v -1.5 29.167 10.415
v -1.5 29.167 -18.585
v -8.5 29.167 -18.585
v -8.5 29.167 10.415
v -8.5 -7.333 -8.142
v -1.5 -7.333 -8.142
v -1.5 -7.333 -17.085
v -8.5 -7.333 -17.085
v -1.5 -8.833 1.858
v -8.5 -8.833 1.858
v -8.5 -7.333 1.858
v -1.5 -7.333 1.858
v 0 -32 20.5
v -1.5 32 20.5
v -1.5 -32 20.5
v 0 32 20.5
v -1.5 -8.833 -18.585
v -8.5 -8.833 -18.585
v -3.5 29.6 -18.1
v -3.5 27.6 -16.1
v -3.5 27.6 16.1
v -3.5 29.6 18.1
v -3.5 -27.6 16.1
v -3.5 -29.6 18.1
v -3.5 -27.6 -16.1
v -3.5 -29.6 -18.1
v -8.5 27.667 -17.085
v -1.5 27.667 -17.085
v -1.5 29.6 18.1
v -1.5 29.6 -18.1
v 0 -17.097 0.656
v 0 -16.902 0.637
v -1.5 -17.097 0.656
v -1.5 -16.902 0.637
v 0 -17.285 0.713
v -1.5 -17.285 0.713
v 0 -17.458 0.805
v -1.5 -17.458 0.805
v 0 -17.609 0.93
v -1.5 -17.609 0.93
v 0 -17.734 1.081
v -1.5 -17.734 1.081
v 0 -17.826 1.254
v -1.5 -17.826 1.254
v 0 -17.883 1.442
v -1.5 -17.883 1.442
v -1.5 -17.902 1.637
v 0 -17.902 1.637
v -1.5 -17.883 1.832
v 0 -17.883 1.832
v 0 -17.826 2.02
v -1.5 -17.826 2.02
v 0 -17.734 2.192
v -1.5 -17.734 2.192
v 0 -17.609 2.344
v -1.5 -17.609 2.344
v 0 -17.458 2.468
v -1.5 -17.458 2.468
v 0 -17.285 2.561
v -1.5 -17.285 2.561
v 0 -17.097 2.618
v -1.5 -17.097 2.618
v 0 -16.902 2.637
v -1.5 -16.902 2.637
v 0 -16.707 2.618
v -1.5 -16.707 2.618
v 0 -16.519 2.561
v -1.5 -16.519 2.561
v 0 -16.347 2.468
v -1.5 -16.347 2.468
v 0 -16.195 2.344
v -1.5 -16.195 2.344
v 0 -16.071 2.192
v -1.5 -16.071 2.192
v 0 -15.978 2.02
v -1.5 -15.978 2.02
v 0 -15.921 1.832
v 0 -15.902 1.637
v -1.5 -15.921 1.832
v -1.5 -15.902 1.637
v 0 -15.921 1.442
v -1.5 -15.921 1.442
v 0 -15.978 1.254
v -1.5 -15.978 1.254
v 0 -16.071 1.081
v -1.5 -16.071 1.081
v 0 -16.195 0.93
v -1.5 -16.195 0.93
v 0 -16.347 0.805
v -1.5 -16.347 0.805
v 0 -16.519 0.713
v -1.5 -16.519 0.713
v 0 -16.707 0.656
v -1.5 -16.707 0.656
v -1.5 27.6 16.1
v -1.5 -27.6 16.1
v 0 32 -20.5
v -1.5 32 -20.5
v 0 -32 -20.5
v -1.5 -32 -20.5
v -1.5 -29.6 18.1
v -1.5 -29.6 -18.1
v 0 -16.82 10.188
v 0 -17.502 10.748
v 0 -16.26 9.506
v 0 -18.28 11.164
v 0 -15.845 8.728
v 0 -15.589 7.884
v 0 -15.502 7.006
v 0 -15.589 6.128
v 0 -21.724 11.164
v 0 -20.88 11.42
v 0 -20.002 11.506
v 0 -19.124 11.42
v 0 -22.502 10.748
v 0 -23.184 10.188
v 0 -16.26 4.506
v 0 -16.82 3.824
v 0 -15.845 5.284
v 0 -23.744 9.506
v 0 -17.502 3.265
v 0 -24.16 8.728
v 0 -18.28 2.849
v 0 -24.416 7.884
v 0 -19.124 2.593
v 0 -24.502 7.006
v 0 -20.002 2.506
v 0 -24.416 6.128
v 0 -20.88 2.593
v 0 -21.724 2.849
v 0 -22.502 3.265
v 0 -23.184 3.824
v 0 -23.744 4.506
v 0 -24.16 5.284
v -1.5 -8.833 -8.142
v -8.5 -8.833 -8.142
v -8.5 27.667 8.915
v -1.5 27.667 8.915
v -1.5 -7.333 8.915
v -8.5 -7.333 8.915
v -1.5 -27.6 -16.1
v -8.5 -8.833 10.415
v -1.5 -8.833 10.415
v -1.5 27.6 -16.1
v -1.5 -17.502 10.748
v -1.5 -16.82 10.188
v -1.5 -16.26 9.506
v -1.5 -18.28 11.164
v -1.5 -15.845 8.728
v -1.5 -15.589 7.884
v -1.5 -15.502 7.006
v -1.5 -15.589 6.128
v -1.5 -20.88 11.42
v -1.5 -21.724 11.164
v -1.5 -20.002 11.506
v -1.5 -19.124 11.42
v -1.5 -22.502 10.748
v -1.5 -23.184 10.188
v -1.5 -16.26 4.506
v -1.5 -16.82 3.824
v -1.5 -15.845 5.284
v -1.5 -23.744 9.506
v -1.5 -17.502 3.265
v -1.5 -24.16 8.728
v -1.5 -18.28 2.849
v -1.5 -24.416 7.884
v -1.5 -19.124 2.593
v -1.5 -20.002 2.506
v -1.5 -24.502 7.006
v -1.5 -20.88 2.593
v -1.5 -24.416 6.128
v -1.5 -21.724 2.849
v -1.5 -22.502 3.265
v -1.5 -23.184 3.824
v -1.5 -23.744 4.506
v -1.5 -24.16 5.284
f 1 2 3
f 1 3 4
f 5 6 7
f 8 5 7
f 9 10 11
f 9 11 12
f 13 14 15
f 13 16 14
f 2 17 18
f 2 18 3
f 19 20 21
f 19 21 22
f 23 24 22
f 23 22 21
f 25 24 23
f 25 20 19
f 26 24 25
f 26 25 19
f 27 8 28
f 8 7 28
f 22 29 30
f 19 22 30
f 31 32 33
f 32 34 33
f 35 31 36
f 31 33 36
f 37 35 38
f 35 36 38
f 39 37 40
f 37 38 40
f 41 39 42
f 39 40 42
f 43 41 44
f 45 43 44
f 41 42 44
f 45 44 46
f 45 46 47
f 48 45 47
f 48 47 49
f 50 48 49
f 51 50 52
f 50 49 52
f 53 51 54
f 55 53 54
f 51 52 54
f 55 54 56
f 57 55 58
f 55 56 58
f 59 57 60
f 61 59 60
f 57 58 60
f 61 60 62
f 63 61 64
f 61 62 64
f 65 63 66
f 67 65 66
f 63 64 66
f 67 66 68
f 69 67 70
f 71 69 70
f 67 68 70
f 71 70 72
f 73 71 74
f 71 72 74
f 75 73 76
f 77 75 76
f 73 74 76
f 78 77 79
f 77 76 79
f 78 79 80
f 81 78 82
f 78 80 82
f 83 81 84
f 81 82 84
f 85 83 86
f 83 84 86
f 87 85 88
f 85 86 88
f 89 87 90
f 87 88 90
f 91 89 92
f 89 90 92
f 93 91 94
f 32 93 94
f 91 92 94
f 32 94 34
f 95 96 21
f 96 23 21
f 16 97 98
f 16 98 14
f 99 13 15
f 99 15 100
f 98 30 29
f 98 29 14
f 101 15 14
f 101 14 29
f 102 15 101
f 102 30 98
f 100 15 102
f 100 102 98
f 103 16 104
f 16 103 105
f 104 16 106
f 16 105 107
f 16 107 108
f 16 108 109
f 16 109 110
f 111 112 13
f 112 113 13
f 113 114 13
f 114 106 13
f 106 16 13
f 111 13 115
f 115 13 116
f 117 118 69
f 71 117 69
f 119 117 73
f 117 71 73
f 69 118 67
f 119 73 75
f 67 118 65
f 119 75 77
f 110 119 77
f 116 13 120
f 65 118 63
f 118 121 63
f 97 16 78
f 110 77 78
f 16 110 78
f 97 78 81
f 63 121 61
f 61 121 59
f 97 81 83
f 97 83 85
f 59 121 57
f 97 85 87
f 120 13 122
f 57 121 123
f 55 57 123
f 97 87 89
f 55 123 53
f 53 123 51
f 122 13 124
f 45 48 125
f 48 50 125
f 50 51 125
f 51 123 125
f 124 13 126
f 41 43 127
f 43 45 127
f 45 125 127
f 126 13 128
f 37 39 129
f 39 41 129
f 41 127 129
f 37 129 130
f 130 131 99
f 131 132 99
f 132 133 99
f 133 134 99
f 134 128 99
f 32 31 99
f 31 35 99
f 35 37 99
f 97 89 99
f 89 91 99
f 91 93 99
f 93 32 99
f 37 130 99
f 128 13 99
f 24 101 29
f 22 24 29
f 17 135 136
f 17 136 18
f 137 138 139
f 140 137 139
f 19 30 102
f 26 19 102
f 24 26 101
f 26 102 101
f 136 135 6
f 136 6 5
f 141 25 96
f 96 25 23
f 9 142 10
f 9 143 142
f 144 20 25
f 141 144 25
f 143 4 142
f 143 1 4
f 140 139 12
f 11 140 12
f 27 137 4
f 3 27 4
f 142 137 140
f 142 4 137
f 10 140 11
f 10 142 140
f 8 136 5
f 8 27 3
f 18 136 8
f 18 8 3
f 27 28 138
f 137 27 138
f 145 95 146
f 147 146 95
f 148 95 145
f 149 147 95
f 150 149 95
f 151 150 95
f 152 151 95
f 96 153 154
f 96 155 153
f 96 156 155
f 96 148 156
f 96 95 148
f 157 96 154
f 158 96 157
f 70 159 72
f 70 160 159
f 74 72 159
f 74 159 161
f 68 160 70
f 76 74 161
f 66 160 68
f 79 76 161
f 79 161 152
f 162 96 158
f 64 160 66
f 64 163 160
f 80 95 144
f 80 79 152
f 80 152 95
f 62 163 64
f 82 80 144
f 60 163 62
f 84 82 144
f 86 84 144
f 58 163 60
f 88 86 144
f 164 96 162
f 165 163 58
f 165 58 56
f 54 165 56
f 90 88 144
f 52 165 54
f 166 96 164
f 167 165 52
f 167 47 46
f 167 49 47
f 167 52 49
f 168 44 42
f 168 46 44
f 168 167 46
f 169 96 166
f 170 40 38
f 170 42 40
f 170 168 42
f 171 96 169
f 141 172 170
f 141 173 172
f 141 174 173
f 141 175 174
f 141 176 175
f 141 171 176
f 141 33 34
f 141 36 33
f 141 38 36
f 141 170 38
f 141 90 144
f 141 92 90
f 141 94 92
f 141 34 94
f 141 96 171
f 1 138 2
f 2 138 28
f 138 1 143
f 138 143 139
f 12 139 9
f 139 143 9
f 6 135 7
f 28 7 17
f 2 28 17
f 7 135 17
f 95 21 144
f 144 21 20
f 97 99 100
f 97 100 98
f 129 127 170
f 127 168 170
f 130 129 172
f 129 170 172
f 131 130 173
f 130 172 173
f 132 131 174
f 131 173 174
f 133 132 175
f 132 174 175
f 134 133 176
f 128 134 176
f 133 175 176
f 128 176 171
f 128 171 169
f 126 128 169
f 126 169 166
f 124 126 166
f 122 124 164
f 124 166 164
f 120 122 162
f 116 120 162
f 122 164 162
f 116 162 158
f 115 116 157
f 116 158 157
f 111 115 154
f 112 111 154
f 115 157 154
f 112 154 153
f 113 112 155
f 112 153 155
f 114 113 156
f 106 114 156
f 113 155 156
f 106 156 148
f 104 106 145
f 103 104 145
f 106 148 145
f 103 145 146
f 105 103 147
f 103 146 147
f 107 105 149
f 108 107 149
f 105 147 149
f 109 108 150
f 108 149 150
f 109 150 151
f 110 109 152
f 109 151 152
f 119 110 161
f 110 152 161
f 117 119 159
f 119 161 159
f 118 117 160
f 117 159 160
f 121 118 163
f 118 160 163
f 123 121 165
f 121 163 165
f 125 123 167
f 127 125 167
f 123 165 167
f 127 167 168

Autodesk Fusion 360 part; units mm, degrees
sketch "Sketch1" plane through (0, 0, 0) normal (0, 0, 1) x (1, 0, 0) in component "D1 holder"
sketch "Sketch2" plane through (0, 0, 0) normal (1, 0, 0) x (0, 0, -1) in component "D1 holder"
  line L0 (-20.5, 32) -> (20.5, 32)
  line L1 (20.5, 32) -> (20.5, -32)
  line L2 (20.5, -32) -> (-20.5, -32)
  line L3 (-20.5, -32) -> (-20.5, 32)
  line L4 (-20.5, 32) -> (20.5, -32) construction
  line L5 (20.5, 32) -> (-20.5, -32) construction
  dimension "d27" = 41
  dimension "d28" = 64
extrude "Extrude1" add sketch "Sketch2" along normal blind 1.5 makes body 1 in component "D1 holder"
sketch "Sketch3" plane through (1.5, 0, 0) normal (1, 0, 0) x (0, 0, -1) in component "D1 holder"
  line L0 (-20.5, -32) -> (20.5, -32)
  line L1 (20.5, -32) -> (20.5, 32)
  line L2 (20.5, 32) -> (-20.5, 32)
  line L3 (-20.5, 32) -> (-20.5, -32)
  line L4 (-18.1, 29.6) -> (-18.1, -29.6)
  line L5 (-18.1, -29.6) -> (18.1, -29.6)
  line L6 (18.1, -29.6) -> (18.1, 29.6)
  line L7 (18.1, 29.6) -> (-18.1, 29.6)
  dimension "d31" = 2.4
extrude "Extrude2" add sketch "Sketch3" along normal blind 2 contours L4 L5 L6 L7 bodies 1 in component "D1 holder"
sketch "Sketch4" plane through (3.5, 0, 0) normal (1, 0, 0) x (0, 0, -1) in component "D1 holder"
  line L0 (18.1, 29.6) -> (-18.1, 29.6)
  line L1 (-18.1, 29.6) -> (-18.1, -29.6)
  line L2 (-18.1, -29.6) -> (18.1, -29.6)
  line L3 (18.1, -29.6) -> (18.1, 29.6)
  line L4 (-16.1, 27.6) -> (-16.1, -27.6)
  line L5 (-16.1, -27.6) -> (16.1, -27.6)
  line L6 (16.1, -27.6) -> (16.1, 27.6)
  line L7 (16.1, 27.6) -> (-16.1, 27.6)
  dimension "d34" = 2
extrude "Extrude3" cut sketch "Sketch4" against normal blind 2 contours L4 L5 L6 L7 bodies 1 in component "D1 holder"
sketch "Sketch8" plane through (1.5, 0, 0) normal (1, 0, 0) x (0, 0, -1) in component "D1 holder"
  line L0 (18.5846, -29.167) -> (-10.4154, -29.167)
  line L1 (-10.4154, -29.167) -> (-10.4154, 8.833)
  line L2 (-10.4154, 8.833) -> (18.5846, 8.833)
  line L3 (18.5846, 8.833) -> (18.5846, -29.167)
  line L4 (17.0846, -27.667) -> (-8.9154, -27.667)
  line L5 (-8.9154, -27.667) -> (-8.9154, 7.333)
  line L6 (-8.9154, 7.333) -> (17.0846, 7.333)
  line L7 (17.0846, 7.333) -> (17.0846, -27.667)
  dimension "d39" = 29
  dimension "d40" = 38
  dimension "d41" = 1.5
extrude "Extrude4" add sketch "Sketch8" along normal blind 7 separate body makes body 2 in component "D1 holder"
sketch "Sketch9" plane through (0, 8.833, 0) normal (0, 1, 0) x (-1, 0, 0) in component "D1 holder"
  line L0 (-1.5, -18.5846) -> (-1.5, 10.4154)
  line L1 (-1.5, 10.4154) -> (-8.5, 10.4154)
  line L2 (-8.5, 10.4154) -> (-8.5, -18.5846)
  line L3 (-8.5, -18.5846) -> (-1.5, -18.5846)
  line L4 (-1.5, -8.142) -> (-8.9091, -8.142)
  line L5 (-8.9091, -8.142) -> (-8.9091, 1.858)
  line L6 (-8.9091, 1.858) -> (-1.5, 1.858)
  line L7 (-1.5, 1.858) -> (-1.5, -8.142)
  dimension "d44" = 10
extrude "Extrude5" cut sketch "Sketch9" against normal blind 1.5 contours L0 L2 L4 L6 L7 bodies 2 in component "D1 holder"
sketch "sensor hole" plane through (3.5, 0, 0) normal (1, 0, 0) x (0, 0, -1) in component "D1 holder"
  circle A0 centre (-7.0063, 20.0021) radius 4.5
  dimension "d47" = 9
extrude "Extrude6" cut sketch "sensor hole" against normal blind 26 bodies 1 in component "D1 holder"
sketch "screw hole" plane through (3.5, 0, 0) normal (1, 0, 0) x (0, 0, -1) in component "D1 holder"
  line L0 (-7.0063, 20.0021) -> (-1.6369, 16.9021)
  line L1 (-7.0063, 20.0021) -> (-1.0063, 20.0021) construction
  circle A0 centre (-1.6369, 16.9021) radius 1
  point P0 (-7.0063, 20.0021)
  dimension "d130" = 30
  dimension "d131" = 6.2
  dimension "d132" = 2
extrude "Extrude7" cut sketch "screw hole" against normal blind 4 bodies 1 in component "D1 holder"
component "D1 holder" placed x (-1, 0, 0) y (0, -1, 0) z (0, 0, 1) at (0, 0, 0)
